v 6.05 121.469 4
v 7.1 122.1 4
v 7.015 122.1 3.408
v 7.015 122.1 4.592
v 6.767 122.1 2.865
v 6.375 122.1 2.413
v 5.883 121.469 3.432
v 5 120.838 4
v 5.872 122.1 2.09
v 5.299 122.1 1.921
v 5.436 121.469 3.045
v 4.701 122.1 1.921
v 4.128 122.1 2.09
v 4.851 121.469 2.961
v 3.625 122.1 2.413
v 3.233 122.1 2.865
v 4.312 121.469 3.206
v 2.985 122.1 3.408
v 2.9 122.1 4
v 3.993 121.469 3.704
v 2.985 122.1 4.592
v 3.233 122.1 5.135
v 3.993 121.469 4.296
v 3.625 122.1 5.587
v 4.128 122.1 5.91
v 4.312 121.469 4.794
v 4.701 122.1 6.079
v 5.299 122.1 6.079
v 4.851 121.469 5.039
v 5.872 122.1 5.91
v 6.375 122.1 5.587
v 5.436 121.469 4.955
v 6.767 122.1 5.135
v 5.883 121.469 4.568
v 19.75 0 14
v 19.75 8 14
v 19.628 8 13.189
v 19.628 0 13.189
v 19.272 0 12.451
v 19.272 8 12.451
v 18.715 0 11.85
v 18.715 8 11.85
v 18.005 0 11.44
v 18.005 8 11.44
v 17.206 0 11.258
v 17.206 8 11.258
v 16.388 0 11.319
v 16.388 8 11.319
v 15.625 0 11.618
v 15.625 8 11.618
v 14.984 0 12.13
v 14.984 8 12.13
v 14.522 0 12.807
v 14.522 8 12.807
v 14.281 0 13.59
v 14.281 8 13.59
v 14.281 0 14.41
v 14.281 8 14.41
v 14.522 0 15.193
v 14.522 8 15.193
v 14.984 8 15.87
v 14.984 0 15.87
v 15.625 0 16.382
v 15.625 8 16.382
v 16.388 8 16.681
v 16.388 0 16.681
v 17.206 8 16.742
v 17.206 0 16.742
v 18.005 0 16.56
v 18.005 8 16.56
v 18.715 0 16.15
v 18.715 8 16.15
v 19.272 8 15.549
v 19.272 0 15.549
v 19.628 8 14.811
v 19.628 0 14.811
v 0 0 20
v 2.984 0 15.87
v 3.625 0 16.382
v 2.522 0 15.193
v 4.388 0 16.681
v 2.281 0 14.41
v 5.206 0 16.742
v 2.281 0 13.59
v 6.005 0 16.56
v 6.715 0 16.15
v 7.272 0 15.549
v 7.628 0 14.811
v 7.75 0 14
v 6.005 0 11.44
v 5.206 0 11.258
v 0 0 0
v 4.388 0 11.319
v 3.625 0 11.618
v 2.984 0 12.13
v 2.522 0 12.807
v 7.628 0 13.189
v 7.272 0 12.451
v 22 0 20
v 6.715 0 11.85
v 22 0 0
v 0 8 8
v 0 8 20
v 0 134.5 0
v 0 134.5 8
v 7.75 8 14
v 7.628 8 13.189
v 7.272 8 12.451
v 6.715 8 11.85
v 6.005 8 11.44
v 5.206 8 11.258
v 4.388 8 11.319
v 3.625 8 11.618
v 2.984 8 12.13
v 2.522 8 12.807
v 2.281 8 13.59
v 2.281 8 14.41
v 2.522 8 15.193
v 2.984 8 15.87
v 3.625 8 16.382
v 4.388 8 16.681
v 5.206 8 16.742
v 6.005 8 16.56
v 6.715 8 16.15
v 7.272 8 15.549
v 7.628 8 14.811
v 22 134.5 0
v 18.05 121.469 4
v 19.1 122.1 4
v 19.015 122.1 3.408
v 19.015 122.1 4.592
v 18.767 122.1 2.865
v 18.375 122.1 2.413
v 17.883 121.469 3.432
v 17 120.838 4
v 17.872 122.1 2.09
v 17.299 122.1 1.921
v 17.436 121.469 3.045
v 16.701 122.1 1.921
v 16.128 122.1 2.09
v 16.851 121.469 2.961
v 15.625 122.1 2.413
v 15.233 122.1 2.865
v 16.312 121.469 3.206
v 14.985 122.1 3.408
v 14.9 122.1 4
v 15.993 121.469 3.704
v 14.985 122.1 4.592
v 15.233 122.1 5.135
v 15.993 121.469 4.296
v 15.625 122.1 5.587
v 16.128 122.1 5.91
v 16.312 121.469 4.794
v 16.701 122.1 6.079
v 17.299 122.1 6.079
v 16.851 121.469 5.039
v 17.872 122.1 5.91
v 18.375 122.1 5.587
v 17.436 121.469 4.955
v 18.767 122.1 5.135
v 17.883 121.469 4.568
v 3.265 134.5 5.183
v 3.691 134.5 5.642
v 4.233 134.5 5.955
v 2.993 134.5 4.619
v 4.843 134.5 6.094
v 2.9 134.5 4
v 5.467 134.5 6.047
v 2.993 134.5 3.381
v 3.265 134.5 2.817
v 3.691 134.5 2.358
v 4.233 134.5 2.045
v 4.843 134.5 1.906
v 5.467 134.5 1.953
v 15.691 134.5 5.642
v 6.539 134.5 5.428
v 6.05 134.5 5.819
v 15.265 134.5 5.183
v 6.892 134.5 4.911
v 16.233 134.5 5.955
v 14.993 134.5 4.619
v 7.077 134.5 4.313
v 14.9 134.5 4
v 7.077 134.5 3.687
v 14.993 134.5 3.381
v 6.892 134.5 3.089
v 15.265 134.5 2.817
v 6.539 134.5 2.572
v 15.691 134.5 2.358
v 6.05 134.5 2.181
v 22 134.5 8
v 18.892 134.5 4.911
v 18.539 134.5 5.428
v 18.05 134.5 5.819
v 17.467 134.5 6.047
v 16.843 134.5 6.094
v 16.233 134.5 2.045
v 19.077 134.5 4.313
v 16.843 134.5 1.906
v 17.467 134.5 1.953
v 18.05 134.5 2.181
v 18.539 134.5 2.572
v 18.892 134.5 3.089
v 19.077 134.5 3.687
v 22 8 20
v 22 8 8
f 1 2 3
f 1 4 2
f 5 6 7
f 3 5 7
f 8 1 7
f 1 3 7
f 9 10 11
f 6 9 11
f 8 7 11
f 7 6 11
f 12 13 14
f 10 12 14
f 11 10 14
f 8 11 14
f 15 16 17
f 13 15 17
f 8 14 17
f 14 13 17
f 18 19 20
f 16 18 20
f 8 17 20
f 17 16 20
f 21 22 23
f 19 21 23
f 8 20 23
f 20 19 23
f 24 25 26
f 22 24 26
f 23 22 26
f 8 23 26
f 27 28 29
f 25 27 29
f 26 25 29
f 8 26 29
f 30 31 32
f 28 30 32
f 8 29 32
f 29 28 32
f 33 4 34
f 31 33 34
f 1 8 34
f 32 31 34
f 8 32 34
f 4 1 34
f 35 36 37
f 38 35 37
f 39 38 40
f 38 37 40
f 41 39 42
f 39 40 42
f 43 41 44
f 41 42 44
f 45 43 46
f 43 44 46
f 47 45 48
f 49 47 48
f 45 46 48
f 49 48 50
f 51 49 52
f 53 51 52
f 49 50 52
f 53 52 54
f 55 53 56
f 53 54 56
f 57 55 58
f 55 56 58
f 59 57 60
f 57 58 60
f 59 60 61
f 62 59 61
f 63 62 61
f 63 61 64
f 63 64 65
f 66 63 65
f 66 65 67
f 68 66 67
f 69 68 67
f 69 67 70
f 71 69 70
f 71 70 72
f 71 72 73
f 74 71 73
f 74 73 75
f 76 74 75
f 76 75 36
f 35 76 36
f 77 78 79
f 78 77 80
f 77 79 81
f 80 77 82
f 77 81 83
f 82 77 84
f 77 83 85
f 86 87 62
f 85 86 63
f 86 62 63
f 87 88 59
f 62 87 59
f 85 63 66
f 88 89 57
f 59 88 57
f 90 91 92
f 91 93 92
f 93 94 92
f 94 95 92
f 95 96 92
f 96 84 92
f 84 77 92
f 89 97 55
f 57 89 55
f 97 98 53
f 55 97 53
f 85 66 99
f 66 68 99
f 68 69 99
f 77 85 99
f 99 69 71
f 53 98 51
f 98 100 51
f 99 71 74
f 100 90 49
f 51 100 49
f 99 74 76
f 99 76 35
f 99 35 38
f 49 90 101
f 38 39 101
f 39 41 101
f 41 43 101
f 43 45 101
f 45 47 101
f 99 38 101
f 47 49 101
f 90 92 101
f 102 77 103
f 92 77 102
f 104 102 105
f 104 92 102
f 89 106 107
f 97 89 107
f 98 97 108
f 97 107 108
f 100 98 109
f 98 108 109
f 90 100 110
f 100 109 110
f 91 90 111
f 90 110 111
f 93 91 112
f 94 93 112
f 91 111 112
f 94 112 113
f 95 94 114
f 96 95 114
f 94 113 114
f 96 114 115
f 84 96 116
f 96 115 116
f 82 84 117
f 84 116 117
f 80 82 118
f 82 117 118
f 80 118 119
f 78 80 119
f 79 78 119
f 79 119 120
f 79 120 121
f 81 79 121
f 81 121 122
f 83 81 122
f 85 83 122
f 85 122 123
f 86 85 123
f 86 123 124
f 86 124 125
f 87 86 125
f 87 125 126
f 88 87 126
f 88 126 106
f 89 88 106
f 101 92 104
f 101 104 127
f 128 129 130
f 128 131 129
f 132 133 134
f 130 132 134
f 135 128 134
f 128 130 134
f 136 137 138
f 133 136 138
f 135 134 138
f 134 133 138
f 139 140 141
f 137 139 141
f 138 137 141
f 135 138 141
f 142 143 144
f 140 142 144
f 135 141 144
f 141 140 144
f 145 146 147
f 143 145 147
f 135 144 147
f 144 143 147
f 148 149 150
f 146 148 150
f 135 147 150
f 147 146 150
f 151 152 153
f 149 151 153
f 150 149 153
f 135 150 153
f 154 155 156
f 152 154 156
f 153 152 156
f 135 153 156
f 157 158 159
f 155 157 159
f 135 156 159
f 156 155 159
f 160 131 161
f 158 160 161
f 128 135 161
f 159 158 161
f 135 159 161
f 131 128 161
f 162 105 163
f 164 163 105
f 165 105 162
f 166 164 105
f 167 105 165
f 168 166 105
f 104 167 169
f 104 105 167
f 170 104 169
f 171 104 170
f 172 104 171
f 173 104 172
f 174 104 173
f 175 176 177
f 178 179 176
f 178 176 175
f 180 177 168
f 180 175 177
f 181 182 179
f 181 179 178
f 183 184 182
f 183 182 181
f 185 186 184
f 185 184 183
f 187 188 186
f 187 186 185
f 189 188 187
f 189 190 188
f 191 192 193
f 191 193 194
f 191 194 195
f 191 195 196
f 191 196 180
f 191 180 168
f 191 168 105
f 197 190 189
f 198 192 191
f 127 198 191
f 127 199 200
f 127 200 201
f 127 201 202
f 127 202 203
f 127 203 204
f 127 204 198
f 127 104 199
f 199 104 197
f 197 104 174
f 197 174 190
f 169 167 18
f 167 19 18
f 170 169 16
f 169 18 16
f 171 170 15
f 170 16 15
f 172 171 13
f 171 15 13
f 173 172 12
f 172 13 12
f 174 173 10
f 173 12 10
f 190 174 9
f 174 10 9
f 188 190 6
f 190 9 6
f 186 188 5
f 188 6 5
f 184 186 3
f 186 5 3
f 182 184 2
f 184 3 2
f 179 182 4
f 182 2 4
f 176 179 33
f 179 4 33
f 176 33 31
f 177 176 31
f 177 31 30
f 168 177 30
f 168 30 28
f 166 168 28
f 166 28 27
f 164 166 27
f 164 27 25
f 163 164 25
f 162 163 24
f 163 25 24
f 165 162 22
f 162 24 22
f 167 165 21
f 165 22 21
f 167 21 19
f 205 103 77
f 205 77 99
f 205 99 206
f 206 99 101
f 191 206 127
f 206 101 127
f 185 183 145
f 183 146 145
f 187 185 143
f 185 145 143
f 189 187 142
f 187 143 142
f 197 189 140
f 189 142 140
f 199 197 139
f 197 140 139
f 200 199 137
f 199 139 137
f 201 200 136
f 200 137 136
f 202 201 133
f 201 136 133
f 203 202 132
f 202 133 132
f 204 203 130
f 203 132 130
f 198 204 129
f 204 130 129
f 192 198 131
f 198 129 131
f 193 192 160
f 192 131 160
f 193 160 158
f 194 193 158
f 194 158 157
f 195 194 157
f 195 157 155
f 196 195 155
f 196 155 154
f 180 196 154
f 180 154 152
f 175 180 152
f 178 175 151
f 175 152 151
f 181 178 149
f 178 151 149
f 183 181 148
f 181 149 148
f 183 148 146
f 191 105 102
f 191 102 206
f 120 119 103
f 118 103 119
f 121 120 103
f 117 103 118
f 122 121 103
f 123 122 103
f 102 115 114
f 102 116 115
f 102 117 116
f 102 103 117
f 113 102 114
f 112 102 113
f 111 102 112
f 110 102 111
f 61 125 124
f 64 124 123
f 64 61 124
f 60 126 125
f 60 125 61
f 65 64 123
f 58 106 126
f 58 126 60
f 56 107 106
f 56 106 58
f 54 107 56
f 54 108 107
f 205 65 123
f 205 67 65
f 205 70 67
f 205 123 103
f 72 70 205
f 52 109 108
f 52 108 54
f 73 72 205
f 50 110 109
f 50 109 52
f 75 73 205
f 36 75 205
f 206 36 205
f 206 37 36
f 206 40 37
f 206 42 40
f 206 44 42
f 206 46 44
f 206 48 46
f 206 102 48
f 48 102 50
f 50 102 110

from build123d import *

# Parameters (mm, degrees)
SKETCH_1_W             = 22
SKETCH_1_H             = 134.5
EXTRUDE_1_DEPTH        = 8
HOLE_WIZARD_M5_1_D     = 4.2
HOLE_WIZARD_M5_1_DEPTH = 12.4
HOLE_WIZARD_M5_1_TIP   = 1.2618073
SKETCH_6_W             = 22
SKETCH_6_H             = 8
EXTRUDE_2_DEPTH        = 12
SKETCH_7_R             = 2.75
CUT_EXTRUDE_1_DEPTH    = 9


with BuildPart() as part:
    # 草图1 → 凸台-拉伸1 (new body)
    with BuildSketch(Plane.XY):
        with Locations((11, 67.25)):
            Rectangle(SKETCH_1_W, SKETCH_1_H)
    extrude(amount=EXTRUDE_1_DEPTH)

    # M5 螺纹孔1
    with Locations(Plane(origin=(0, 134.5, 0), x_dir=(1, 0, 0), z_dir=(0, 1, 0))):
        with Locations((17, -4), (5, -4)):
            Hole(HOLE_WIZARD_M5_1_D / 2, depth=HOLE_WIZARD_M5_1_DEPTH)
            with Locations((0, 0, -(HOLE_WIZARD_M5_1_DEPTH + HOLE_WIZARD_M5_1_TIP / 2))):  # 118° drill point
                Cone(0, HOLE_WIZARD_M5_1_D / 2, HOLE_WIZARD_M5_1_TIP, mode=Mode.SUBTRACT)

    # 草图6 → 凸台-拉伸2 (add)
    with BuildSketch(Plane.XY.offset(8)):
        with Locations((11, 4)):
            Rectangle(SKETCH_6_W, SKETCH_6_H)
    extrude(amount=EXTRUDE_2_DEPTH)

    # 草图7 → 切除-拉伸1 (cut, through all)
    with BuildSketch(Plane(origin=(0, 8, 0), x_dir=(1, 0, 0), z_dir=(0, 1, 0))):
        with Locations((5, -14)):
            Circle(SKETCH_7_R)
        with Locations((17, -14)):
            Circle(SKETCH_7_R)
    extrude(amount=-CUT_EXTRUDE_1_DEPTH, mode=Mode.SUBTRACT)


solid = part.part
